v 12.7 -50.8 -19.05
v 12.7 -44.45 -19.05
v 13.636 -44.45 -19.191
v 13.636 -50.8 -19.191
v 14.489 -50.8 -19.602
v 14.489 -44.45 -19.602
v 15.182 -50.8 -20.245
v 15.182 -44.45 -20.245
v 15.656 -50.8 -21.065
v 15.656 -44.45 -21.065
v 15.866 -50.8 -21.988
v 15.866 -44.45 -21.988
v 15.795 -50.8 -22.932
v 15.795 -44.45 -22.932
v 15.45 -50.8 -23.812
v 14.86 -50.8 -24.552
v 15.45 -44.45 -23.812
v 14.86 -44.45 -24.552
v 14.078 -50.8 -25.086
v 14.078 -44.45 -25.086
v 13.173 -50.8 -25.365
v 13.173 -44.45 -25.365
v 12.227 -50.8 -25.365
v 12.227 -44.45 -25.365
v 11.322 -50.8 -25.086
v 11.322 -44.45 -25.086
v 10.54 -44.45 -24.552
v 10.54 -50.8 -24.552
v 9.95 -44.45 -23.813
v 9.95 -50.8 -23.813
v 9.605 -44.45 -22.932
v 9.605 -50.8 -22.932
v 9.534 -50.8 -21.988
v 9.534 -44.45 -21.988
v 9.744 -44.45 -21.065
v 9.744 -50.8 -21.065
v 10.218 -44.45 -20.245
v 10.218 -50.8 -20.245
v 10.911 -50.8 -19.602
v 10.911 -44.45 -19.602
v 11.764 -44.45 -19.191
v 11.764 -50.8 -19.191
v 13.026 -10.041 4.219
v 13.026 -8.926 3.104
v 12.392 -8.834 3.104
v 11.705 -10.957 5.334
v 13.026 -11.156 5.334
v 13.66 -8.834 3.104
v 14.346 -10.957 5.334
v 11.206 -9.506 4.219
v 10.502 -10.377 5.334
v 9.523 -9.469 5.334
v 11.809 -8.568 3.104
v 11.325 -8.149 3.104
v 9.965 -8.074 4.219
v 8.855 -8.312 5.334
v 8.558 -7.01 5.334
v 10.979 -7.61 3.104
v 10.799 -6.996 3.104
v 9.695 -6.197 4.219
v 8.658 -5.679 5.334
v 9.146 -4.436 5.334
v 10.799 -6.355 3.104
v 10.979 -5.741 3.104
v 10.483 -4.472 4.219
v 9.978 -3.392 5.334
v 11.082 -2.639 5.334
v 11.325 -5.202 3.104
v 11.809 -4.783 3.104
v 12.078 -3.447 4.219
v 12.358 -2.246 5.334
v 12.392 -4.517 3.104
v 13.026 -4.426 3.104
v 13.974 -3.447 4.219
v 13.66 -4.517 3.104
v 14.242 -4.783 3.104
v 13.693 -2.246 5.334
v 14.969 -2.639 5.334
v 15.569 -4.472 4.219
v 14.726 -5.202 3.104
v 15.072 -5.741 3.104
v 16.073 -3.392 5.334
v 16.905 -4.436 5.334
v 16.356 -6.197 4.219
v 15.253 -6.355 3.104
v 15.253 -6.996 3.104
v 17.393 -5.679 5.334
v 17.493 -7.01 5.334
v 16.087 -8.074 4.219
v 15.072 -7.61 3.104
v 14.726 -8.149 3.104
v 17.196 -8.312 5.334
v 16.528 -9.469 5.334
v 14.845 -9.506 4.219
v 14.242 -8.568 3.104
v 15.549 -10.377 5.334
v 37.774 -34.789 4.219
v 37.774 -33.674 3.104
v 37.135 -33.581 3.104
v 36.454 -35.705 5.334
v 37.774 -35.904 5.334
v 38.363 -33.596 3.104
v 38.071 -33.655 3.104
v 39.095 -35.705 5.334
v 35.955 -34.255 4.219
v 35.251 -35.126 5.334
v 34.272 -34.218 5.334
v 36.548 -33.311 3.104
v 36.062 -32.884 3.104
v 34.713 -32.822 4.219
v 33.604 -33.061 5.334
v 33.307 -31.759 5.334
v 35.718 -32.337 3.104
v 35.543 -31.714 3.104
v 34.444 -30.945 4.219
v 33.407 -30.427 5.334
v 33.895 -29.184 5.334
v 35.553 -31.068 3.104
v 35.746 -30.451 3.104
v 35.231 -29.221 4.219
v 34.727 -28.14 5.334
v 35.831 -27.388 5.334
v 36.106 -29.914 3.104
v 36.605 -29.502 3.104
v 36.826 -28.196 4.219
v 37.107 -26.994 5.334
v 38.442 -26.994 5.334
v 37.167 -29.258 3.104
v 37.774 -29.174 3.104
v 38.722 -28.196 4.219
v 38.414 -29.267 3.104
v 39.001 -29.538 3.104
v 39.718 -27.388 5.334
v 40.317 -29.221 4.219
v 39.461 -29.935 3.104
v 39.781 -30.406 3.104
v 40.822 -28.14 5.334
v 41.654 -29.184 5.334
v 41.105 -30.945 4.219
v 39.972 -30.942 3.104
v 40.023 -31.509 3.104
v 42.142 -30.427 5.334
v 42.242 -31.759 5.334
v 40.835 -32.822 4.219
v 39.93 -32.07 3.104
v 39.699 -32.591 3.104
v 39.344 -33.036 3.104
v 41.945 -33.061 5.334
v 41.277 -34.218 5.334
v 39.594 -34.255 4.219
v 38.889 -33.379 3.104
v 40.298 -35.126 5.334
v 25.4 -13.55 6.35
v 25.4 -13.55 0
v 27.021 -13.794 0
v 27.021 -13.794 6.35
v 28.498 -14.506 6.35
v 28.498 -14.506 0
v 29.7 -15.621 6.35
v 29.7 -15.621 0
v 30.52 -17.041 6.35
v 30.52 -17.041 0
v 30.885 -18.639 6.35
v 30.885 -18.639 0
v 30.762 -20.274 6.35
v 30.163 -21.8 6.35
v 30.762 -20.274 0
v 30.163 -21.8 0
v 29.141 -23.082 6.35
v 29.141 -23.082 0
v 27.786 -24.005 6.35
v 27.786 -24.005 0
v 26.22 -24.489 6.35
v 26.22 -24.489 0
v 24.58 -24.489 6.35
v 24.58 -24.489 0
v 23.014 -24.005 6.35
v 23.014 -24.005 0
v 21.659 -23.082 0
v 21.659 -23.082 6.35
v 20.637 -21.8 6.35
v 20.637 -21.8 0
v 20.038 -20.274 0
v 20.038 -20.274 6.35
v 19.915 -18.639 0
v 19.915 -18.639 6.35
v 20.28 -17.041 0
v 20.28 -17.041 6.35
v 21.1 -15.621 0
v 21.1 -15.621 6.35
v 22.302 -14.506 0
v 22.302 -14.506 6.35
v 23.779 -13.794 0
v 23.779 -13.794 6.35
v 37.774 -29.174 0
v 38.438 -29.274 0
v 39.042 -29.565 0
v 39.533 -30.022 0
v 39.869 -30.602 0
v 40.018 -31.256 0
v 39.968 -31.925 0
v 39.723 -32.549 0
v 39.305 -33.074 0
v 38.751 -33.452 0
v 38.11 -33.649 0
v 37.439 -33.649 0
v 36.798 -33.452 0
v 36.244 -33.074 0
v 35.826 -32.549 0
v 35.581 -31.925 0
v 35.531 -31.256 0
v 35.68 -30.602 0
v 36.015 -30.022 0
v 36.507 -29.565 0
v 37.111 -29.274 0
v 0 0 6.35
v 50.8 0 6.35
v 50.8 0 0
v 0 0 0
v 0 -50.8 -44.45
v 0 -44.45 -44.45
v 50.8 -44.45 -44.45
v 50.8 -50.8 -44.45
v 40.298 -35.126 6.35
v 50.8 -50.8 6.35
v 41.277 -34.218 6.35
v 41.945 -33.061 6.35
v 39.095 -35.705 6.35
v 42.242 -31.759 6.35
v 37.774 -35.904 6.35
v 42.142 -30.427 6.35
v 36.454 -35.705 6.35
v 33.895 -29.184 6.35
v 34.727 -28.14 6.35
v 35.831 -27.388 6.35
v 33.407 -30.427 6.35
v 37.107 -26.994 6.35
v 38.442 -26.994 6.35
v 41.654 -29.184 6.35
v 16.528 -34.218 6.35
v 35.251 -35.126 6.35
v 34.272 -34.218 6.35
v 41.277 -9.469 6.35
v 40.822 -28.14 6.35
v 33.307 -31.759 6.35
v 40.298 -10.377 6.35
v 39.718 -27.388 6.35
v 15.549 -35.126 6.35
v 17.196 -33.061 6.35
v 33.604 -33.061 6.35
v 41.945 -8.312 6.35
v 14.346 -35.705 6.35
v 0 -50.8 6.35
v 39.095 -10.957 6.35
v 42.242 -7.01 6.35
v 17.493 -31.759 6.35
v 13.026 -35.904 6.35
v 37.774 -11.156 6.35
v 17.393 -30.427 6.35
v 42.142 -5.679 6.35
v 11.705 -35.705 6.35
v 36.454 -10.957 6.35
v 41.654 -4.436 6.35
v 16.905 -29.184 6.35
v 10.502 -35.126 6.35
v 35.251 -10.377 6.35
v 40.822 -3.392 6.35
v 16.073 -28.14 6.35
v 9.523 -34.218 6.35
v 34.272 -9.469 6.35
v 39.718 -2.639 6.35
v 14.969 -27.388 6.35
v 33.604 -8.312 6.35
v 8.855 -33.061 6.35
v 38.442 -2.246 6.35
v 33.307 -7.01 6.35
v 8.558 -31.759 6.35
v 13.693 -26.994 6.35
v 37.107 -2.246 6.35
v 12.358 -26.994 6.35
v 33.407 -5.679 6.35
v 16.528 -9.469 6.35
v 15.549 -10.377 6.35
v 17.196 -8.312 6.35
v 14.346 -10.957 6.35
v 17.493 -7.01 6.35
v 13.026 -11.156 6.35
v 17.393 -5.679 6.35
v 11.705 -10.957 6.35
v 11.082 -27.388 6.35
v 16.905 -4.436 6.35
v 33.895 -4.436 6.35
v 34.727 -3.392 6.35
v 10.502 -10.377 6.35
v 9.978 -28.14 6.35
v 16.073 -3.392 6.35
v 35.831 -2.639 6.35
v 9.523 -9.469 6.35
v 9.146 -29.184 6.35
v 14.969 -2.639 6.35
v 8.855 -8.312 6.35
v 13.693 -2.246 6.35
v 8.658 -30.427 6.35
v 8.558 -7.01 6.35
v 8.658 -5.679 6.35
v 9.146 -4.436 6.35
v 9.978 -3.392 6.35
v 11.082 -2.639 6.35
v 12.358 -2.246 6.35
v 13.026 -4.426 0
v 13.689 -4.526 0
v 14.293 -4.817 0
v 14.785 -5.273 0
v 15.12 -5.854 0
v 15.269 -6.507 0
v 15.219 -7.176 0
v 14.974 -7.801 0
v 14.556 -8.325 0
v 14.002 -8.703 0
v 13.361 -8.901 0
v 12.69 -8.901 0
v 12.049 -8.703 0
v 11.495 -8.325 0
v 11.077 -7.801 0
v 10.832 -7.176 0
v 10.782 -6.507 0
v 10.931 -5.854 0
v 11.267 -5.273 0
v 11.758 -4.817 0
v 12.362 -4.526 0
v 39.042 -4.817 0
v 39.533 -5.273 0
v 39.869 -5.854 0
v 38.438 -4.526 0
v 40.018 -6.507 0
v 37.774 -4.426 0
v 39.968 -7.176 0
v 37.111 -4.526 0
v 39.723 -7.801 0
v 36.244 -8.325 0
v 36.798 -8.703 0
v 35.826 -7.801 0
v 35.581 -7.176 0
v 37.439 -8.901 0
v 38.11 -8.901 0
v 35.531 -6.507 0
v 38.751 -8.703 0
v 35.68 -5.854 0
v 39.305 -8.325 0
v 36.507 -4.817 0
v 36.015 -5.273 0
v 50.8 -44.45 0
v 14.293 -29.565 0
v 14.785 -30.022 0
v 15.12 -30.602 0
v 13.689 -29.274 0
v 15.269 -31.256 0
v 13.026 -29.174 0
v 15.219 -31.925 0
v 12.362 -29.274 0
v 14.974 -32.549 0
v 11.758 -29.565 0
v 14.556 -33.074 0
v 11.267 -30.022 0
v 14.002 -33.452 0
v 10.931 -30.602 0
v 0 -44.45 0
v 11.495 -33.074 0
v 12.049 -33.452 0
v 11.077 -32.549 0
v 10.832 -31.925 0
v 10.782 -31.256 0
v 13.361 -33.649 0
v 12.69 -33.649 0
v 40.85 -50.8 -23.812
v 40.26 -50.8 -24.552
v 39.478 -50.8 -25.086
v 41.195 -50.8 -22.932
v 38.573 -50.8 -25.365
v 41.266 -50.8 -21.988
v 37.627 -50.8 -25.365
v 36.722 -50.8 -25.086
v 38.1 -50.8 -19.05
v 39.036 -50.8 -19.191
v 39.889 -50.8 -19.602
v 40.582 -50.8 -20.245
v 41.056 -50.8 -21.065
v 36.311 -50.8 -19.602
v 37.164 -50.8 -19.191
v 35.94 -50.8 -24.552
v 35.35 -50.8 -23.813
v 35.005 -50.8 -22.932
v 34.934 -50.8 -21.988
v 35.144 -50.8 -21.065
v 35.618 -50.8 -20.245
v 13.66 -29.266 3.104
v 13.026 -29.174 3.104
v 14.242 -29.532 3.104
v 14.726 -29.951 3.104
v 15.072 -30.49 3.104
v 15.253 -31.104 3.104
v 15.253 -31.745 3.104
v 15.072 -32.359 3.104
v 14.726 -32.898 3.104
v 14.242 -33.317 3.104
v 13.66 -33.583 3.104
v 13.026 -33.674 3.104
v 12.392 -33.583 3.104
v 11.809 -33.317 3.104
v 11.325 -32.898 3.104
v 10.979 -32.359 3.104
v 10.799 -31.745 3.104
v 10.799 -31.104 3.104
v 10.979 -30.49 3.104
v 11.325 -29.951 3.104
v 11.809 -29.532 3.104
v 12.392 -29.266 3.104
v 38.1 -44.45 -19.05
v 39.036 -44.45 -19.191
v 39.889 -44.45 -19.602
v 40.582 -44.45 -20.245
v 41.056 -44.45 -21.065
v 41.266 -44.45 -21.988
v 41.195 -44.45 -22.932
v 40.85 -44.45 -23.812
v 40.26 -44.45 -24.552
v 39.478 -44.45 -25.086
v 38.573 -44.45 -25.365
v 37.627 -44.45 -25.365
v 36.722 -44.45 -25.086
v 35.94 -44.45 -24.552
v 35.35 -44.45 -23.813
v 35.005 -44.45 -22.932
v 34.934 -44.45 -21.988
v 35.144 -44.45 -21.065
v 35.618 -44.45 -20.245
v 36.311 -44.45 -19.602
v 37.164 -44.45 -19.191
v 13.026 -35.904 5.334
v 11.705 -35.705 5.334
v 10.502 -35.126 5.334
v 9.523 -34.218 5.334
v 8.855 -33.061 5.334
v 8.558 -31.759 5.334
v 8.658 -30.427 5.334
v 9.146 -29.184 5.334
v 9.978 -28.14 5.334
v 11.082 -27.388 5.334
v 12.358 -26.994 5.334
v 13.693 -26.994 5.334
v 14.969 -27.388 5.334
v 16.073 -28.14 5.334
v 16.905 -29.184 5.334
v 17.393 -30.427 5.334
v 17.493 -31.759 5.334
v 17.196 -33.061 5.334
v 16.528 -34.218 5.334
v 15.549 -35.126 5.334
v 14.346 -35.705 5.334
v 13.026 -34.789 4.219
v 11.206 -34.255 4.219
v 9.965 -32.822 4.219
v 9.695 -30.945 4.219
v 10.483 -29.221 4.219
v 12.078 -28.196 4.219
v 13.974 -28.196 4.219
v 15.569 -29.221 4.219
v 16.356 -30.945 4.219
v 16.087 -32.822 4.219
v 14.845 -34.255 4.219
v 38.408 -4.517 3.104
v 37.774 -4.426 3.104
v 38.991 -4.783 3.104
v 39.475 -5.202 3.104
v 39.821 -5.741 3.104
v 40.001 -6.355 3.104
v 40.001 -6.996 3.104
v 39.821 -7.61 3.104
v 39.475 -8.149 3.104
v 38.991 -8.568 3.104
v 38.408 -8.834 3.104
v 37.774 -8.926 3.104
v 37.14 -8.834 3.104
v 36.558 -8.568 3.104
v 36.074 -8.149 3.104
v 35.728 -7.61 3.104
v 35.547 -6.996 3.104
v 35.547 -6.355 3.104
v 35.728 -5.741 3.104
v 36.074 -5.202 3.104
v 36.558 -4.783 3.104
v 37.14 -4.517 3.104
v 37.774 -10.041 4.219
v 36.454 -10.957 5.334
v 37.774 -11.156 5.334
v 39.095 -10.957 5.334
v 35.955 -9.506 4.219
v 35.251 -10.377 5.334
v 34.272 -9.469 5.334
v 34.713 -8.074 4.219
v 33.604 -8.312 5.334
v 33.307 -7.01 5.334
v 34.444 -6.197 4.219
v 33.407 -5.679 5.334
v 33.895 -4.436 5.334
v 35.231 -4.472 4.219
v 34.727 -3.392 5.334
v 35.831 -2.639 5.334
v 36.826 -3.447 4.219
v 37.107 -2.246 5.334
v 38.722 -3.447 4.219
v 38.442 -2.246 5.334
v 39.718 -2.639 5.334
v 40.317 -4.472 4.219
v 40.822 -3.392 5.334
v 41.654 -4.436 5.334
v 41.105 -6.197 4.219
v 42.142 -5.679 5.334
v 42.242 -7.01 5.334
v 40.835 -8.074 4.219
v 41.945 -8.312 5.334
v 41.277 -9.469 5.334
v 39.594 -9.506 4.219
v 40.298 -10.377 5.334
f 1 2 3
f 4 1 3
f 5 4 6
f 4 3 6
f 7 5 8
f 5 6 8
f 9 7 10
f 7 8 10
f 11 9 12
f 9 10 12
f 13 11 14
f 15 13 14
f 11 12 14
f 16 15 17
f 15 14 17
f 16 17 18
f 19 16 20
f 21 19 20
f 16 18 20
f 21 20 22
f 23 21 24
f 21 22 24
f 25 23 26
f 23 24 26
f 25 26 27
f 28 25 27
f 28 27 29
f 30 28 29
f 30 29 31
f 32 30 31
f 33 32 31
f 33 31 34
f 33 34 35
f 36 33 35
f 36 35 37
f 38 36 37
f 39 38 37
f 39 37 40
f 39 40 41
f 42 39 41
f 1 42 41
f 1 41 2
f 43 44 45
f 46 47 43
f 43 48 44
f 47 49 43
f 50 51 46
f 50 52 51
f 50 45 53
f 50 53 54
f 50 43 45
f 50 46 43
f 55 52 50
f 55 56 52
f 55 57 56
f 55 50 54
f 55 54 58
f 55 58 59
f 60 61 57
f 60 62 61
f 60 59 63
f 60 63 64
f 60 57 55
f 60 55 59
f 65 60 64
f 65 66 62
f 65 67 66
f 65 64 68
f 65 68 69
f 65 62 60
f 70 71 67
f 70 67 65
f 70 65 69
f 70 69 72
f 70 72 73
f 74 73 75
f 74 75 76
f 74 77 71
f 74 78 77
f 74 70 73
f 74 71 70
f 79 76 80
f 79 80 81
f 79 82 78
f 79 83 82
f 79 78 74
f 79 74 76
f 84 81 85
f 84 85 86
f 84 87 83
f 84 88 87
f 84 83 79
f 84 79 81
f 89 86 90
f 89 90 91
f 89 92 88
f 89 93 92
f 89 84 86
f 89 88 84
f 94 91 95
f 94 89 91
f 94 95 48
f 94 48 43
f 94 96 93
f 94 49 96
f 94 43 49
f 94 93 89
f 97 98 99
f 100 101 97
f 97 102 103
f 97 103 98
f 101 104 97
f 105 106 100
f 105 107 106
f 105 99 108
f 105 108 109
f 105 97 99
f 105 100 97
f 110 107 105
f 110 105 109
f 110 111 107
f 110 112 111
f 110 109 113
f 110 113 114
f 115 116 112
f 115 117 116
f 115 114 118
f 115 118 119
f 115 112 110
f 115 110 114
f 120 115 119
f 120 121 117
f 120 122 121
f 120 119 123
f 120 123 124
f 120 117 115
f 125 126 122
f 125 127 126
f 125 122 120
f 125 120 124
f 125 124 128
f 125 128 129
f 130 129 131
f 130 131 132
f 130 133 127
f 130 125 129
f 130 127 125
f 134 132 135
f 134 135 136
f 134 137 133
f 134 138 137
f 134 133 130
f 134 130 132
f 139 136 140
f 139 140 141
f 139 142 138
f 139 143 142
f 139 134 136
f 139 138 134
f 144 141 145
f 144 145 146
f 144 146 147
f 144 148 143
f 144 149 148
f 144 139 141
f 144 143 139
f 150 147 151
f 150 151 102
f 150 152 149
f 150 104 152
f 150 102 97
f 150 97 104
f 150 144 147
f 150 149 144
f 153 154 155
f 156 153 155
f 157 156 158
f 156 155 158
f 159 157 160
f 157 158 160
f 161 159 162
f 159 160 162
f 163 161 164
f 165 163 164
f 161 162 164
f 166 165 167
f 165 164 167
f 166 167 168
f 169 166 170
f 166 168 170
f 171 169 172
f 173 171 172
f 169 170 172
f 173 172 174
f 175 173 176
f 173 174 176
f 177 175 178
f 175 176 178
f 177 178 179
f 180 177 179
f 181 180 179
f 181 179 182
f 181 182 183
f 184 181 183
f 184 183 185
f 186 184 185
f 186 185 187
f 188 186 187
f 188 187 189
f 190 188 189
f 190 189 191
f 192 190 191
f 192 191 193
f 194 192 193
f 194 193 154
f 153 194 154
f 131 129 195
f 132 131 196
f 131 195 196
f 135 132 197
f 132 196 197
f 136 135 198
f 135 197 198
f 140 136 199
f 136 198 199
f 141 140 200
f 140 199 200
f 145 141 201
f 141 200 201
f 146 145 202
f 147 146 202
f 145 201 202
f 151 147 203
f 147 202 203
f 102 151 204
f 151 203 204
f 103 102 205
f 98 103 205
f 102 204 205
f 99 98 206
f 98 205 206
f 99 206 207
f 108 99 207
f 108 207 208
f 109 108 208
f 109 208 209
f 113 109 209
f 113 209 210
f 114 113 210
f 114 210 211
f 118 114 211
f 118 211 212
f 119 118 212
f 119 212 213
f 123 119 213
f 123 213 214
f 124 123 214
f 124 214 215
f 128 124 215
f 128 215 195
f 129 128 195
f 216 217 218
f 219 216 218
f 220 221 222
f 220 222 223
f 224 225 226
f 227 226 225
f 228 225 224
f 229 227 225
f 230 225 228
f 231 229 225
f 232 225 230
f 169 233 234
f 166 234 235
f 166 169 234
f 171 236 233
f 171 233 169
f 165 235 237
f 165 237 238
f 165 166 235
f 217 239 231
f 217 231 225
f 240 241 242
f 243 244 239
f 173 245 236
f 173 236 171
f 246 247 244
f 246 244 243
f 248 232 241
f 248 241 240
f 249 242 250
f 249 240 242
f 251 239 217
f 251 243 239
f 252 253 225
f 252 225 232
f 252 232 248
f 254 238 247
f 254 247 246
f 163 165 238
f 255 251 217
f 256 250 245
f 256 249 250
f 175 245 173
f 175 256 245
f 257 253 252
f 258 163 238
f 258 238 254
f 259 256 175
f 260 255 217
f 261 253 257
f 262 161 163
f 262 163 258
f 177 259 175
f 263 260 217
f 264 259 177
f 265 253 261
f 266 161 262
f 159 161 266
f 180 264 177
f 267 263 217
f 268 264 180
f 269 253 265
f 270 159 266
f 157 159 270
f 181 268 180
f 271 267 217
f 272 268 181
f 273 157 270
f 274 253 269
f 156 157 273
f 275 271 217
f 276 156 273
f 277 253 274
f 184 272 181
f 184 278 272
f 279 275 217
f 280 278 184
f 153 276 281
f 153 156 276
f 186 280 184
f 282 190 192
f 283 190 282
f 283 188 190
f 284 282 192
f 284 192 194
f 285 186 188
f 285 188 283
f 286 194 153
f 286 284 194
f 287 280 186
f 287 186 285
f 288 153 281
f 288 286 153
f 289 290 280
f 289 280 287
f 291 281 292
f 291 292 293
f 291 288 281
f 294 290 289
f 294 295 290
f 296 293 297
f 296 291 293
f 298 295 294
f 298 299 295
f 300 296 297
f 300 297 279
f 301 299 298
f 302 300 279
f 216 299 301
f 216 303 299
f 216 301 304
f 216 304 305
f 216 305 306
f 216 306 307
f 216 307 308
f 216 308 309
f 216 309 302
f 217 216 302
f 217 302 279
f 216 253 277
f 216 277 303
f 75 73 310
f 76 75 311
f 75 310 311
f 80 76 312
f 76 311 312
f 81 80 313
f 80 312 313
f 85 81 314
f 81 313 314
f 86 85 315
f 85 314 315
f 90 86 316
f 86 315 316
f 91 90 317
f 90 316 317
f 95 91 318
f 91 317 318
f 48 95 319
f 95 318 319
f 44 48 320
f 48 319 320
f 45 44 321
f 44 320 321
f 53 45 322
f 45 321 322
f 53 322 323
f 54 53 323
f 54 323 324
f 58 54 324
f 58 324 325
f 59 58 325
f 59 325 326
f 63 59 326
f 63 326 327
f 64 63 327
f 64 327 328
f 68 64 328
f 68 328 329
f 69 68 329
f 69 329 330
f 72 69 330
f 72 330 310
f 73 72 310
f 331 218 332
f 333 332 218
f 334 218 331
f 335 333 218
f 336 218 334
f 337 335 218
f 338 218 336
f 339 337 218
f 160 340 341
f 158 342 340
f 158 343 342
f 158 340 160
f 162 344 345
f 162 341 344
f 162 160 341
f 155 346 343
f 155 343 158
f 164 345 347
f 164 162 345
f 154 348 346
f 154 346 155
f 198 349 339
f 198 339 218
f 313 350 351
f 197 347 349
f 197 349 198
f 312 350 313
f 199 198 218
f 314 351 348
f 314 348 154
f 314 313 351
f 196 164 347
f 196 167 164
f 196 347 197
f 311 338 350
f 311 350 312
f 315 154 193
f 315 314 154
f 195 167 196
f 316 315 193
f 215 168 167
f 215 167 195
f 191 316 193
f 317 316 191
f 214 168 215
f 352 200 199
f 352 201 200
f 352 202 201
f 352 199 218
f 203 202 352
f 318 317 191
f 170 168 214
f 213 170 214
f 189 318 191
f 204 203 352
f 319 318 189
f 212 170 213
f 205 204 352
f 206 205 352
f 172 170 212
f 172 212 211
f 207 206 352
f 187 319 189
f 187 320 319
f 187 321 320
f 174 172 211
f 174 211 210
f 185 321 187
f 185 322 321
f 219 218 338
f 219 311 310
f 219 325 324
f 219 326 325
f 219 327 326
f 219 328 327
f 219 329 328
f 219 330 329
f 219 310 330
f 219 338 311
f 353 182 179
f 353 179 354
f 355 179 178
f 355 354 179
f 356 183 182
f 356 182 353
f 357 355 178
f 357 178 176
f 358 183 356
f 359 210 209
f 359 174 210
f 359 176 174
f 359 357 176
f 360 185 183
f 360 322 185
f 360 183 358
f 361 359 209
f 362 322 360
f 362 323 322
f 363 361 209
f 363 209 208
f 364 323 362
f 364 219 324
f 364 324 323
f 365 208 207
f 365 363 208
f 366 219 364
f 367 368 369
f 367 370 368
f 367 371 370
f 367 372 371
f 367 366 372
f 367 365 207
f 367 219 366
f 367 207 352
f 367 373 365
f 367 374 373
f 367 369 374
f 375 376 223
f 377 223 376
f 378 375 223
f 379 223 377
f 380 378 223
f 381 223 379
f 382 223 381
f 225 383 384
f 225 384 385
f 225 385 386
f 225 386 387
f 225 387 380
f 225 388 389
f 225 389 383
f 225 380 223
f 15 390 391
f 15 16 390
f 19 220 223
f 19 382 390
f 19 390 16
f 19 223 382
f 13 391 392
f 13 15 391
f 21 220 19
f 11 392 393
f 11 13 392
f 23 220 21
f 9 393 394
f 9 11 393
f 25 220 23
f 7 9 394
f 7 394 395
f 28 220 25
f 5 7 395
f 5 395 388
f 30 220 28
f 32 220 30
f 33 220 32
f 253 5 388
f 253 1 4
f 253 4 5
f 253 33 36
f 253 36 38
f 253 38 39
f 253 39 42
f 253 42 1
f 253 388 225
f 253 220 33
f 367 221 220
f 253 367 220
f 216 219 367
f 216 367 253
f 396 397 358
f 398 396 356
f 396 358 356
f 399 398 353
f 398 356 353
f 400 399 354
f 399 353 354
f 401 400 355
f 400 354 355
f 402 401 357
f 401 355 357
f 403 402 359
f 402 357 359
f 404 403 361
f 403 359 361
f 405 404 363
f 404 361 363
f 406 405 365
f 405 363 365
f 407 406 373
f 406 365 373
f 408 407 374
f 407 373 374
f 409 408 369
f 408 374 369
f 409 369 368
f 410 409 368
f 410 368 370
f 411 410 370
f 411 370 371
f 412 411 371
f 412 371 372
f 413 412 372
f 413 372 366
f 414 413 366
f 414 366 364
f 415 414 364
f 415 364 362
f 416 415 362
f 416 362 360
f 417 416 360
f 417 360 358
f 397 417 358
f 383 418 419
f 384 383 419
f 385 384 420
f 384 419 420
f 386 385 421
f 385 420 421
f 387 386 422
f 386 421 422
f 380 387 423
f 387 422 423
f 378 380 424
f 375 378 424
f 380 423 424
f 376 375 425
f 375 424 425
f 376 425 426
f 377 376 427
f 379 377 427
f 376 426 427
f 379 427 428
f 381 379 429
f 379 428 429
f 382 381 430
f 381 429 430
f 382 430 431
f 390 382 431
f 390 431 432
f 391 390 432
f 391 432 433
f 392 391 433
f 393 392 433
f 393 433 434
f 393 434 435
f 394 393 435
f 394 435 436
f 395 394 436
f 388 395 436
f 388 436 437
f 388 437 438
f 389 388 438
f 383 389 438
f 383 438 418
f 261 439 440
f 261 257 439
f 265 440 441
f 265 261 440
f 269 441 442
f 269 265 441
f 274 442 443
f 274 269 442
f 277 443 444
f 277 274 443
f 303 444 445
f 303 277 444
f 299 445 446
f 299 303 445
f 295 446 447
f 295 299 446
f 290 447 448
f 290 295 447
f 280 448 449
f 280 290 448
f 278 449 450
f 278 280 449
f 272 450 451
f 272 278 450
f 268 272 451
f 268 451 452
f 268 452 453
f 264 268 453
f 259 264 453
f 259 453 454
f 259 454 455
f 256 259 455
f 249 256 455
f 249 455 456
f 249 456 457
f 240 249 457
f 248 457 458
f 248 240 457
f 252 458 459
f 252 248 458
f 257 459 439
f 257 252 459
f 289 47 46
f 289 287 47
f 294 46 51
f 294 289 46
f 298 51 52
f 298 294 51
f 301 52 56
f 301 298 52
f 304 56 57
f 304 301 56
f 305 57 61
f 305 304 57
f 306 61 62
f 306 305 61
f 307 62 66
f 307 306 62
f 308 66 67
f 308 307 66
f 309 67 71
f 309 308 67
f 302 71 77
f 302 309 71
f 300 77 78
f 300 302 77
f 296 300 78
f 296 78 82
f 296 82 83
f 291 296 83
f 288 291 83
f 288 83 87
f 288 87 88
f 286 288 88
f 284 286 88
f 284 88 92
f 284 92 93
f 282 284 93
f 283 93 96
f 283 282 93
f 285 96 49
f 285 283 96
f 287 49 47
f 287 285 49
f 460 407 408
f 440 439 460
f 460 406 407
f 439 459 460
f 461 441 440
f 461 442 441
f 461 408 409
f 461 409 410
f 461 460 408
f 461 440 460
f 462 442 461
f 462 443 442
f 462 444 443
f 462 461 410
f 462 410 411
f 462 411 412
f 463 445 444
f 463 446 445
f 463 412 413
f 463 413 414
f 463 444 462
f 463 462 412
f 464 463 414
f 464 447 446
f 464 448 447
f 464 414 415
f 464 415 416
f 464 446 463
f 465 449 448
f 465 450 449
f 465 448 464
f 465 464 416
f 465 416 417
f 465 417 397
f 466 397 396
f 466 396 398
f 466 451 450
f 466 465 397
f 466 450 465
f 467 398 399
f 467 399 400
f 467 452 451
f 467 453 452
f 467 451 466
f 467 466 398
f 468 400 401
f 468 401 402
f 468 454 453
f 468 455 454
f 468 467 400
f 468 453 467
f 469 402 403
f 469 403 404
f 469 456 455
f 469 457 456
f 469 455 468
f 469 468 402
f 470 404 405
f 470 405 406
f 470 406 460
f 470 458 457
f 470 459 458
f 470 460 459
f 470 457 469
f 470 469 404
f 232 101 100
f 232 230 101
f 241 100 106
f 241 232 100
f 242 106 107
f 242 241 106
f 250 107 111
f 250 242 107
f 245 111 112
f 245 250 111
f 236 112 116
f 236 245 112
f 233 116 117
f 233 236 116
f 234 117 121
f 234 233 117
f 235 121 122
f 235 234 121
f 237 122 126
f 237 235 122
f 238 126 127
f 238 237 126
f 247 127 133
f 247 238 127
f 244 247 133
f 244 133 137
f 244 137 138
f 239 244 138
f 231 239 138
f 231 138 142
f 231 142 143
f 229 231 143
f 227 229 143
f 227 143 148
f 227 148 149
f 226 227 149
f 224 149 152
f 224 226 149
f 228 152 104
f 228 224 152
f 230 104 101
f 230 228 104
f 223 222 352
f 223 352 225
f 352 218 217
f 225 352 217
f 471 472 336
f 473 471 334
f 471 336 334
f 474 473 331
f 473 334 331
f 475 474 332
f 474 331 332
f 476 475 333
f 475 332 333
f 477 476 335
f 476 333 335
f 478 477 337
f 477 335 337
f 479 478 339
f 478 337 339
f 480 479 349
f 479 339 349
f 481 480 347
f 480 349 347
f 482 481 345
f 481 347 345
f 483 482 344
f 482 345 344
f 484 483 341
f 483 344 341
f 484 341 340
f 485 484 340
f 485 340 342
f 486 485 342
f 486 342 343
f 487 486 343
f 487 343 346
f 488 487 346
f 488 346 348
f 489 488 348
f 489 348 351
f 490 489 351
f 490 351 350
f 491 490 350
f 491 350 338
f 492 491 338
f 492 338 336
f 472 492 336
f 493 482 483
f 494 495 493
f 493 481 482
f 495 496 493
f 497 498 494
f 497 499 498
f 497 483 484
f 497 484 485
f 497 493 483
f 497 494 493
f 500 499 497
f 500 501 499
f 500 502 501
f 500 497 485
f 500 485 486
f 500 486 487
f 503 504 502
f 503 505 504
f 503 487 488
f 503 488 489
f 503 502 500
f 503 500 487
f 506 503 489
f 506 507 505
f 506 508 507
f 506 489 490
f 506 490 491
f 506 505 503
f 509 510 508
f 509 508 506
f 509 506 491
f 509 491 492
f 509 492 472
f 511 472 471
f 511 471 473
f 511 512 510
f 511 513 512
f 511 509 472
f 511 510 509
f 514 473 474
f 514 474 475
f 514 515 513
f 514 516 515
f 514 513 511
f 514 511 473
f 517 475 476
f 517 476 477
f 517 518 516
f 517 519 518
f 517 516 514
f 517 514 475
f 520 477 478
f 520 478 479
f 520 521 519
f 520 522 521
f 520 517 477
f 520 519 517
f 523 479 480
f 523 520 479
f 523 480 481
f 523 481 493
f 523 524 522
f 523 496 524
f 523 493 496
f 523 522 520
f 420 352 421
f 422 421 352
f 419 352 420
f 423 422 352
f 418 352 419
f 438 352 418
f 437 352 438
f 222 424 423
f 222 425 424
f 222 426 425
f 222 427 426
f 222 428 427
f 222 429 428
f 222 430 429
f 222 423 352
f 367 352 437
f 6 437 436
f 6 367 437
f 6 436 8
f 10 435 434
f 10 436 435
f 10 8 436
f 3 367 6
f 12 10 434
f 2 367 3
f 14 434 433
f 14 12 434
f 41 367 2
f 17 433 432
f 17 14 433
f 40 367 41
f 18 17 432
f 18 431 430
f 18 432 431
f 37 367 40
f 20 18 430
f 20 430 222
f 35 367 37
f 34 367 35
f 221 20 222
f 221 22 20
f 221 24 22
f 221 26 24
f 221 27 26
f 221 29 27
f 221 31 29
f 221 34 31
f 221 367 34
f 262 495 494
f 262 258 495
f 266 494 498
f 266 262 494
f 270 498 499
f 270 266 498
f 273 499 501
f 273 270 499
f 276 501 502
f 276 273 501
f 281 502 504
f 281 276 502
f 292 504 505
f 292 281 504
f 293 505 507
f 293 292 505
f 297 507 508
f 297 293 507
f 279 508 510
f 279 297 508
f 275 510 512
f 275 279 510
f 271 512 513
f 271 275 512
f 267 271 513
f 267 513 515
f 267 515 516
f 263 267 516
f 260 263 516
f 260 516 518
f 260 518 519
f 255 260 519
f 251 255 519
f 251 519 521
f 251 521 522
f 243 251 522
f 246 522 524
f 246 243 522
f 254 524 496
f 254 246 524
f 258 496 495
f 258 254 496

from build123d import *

# Parameters (mm, degrees)
BOSS_EXTRUDE1_DEPTH          = 50.8
CUT_EXTRUDE1_REACH           = 86.481
SKETCH2_R                    = 2.25
SKETCH2_R_2                  = 5.5
CUT_EXTRUDE2_REACH           = 82.822
SKETCH4_R                    = 3.175
CSK_FOR_M4_SFHCS1_AT_2_COUNT = 2
CSK_FOR_M4_SFHCS1_AT_2_PITCH = 24.748737342
CSK_FOR_M4_SFHCS1_AT_3_COUNT = 2
CSK_FOR_M4_SFHCS1_AT_3_PITCH = 35
CSK_FOR_M4_SFHCS1_AT_4_COUNT = 2
CSK_FOR_M4_SFHCS1_AT_4_PITCH = 24.748737342


with BuildPart() as part:
    # Sketch1 → Boss-Extrude1 (new body)
    with BuildSketch(Plane(origin=(0, 0, 0), x_dir=(0, 0, -1), z_dir=(1, 0, 0))):
        Polygon((0, 0), (0, -44.45), (44.45, -44.45), (44.45, -50.8), (-6.35, -50.8), (-6.35, 0), align=None)
    extrude(amount=BOSS_EXTRUDE1_DEPTH)

    # Sketch2 → Cut-Extrude1 (cut, up to next)
    with BuildSketch(Plane(origin=(0, 0, 0), x_dir=(-1, 0, 0), z_dir=(0, 0, -1)), mode=Mode.PRIVATE) as cut_extrude1_sk1:
        with Locations(Location((-13.025631329, -6.675631329, 0), (0, 0, 90))):
            Circle(SKETCH2_R)
    cut_extrude1_tool1 = extrude(cut_extrude1_sk1.sketch, amount=-CUT_EXTRUDE1_REACH, mode=Mode.PRIVATE) & part.part
    # Sketch2 → Cut-Extrude1 (cut, up to next)
    with BuildSketch(Plane(origin=(0, 0, 0), x_dir=(-1, 0, 0), z_dir=(0, 0, -1)), mode=Mode.PRIVATE) as cut_extrude1_sk2:
        with Locations(Location((-13.025631329, -31.424368671, 0), (0, 0, 90))):
            Circle(SKETCH2_R)
    cut_extrude1_tool2 = extrude(cut_extrude1_sk2.sketch, amount=-CUT_EXTRUDE1_REACH, mode=Mode.PRIVATE) & part.part
    # Sketch2 → Cut-Extrude1 (cut, up to next)
    with BuildSketch(Plane(origin=(0, 0, 0), x_dir=(-1, 0, 0), z_dir=(0, 0, -1)), mode=Mode.PRIVATE) as cut_extrude1_sk3:
        with Locations(Location((-37.774368671, -31.424368671, 0), (0, 0, 90))):
            Circle(SKETCH2_R)
    cut_extrude1_tool3 = extrude(cut_extrude1_sk3.sketch, amount=-CUT_EXTRUDE1_REACH, mode=Mode.PRIVATE) & part.part
    # Sketch2 → Cut-Extrude1 (cut, up to next)
    with BuildSketch(Plane(origin=(0, 0, 0), x_dir=(-1, 0, 0), z_dir=(0, 0, -1)), mode=Mode.PRIVATE) as cut_extrude1_sk4:
        with Locations(Location((-37.774368671, -6.675631329, 0), (0, 0, 90))):
            Circle(SKETCH2_R)
    cut_extrude1_tool4 = extrude(cut_extrude1_sk4.sketch, amount=-CUT_EXTRUDE1_REACH, mode=Mode.PRIVATE) & part.part
    # Sketch2 → Cut-Extrude1 (cut, up to next)
    with BuildSketch(Plane(origin=(0, 0, 0), x_dir=(-1, 0, 0), z_dir=(0, 0, -1)), mode=Mode.PRIVATE) as cut_extrude1_sk5:
        with Locations(Location((-25.4, -19.05, 0), (0, 0, 90))):
            Circle(SKETCH2_R_2)
    cut_extrude1_tool5 = extrude(cut_extrude1_sk5.sketch, amount=-CUT_EXTRUDE1_REACH, mode=Mode.PRIVATE) & part.part
    add(cut_extrude1_tool1.solids().sort_by_distance((13.025631, -6.675631, 0))[0], mode=Mode.SUBTRACT)
    add(cut_extrude1_tool2.solids().sort_by_distance((13.025631, -31.424369, 0))[0], mode=Mode.SUBTRACT)
    add(cut_extrude1_tool3.solids().sort_by_distance((37.774369, -31.424369, 0))[0], mode=Mode.SUBTRACT)
    add(cut_extrude1_tool4.solids().sort_by_distance((37.774369, -6.675631, 0))[0], mode=Mode.SUBTRACT)
    add(cut_extrude1_tool5.solids().sort_by_distance((25.4, -19.05, 0))[0], mode=Mode.SUBTRACT)

    # Sketch4 → Cut-Extrude2 (cut, up to next)
    with BuildSketch(Plane(origin=(0, -44.45, 0), x_dir=(1, 0, 0), z_dir=(0, 1, 0)), mode=Mode.PRIVATE) as cut_extrude2_sk1:
        with Locations(Location((12.7, 22.225, 0), (0, 0, 270))):
            Circle(SKETCH4_R)
    cut_extrude2_tool1 = extrude(cut_extrude2_sk1.sketch, amount=-CUT_EXTRUDE2_REACH, mode=Mode.PRIVATE) & part.part
    # Sketch4 → Cut-Extrude2 (cut, up to next)
    with BuildSketch(Plane(origin=(0, -44.45, 0), x_dir=(1, 0, 0), z_dir=(0, 1, 0)), mode=Mode.PRIVATE) as cut_extrude2_sk2:
        with Locations(Location((38.1, 22.225, 0), (0, 0, 270))):
            Circle(SKETCH4_R)
    cut_extrude2_tool2 = extrude(cut_extrude2_sk2.sketch, amount=-CUT_EXTRUDE2_REACH, mode=Mode.PRIVATE) & part.part
    add(cut_extrude2_tool1.solids().sort_by_distance((12.7, -44.45, -22.225))[0], mode=Mode.SUBTRACT)
    add(cut_extrude2_tool2.solids().sort_by_distance((38.1, -44.45, -22.225))[0], mode=Mode.SUBTRACT)

    # Sketch5 → CSK for M4 SFHCS1 (revolve, cut)
    with BuildSketch(Plane(origin=(13.025631329, -6.675631329, 6.35), x_dir=(0, -1, 0), z_dir=(1, 0, 0))):
        Polygon((0, 0), (0, 50.8), (2.15, 50.8), (2.15, 3.346), (4.48, 1.016), (4.48, 0), align=None)
    csk_for_m4_sfhcs1 = revolve(axis=Axis((13.025631329, -6.675631329, 12.7), (0, 0, -1)), mode=Mode.SUBTRACT)

    # CSK for M4 SFHCS1 at 2: CSK for M4 SFHCS1 ×2
    with Locations(*[(i * CSK_FOR_M4_SFHCS1_AT_2_PITCH, 0, 0) for i in range(1, CSK_FOR_M4_SFHCS1_AT_2_COUNT)]):
        add(csk_for_m4_sfhcs1, mode=Mode.SUBTRACT)

    # CSK for M4 SFHCS1 at 3: CSK for M4 SFHCS1 ×2
    with Locations(*[Vector(0.7071067811865426, -0.7071067811865525, 0) * (i * CSK_FOR_M4_SFHCS1_AT_3_PITCH) for i in range(1, CSK_FOR_M4_SFHCS1_AT_3_COUNT)]):
        add(csk_for_m4_sfhcs1, mode=Mode.SUBTRACT)

    # CSK for M4 SFHCS1 at 4: CSK for M4 SFHCS1 ×2
    with Locations(*[(0, -i * CSK_FOR_M4_SFHCS1_AT_4_PITCH, 0) for i in range(1, CSK_FOR_M4_SFHCS1_AT_4_COUNT)]):
        add(csk_for_m4_sfhcs1, mode=Mode.SUBTRACT)


solid = part.part
